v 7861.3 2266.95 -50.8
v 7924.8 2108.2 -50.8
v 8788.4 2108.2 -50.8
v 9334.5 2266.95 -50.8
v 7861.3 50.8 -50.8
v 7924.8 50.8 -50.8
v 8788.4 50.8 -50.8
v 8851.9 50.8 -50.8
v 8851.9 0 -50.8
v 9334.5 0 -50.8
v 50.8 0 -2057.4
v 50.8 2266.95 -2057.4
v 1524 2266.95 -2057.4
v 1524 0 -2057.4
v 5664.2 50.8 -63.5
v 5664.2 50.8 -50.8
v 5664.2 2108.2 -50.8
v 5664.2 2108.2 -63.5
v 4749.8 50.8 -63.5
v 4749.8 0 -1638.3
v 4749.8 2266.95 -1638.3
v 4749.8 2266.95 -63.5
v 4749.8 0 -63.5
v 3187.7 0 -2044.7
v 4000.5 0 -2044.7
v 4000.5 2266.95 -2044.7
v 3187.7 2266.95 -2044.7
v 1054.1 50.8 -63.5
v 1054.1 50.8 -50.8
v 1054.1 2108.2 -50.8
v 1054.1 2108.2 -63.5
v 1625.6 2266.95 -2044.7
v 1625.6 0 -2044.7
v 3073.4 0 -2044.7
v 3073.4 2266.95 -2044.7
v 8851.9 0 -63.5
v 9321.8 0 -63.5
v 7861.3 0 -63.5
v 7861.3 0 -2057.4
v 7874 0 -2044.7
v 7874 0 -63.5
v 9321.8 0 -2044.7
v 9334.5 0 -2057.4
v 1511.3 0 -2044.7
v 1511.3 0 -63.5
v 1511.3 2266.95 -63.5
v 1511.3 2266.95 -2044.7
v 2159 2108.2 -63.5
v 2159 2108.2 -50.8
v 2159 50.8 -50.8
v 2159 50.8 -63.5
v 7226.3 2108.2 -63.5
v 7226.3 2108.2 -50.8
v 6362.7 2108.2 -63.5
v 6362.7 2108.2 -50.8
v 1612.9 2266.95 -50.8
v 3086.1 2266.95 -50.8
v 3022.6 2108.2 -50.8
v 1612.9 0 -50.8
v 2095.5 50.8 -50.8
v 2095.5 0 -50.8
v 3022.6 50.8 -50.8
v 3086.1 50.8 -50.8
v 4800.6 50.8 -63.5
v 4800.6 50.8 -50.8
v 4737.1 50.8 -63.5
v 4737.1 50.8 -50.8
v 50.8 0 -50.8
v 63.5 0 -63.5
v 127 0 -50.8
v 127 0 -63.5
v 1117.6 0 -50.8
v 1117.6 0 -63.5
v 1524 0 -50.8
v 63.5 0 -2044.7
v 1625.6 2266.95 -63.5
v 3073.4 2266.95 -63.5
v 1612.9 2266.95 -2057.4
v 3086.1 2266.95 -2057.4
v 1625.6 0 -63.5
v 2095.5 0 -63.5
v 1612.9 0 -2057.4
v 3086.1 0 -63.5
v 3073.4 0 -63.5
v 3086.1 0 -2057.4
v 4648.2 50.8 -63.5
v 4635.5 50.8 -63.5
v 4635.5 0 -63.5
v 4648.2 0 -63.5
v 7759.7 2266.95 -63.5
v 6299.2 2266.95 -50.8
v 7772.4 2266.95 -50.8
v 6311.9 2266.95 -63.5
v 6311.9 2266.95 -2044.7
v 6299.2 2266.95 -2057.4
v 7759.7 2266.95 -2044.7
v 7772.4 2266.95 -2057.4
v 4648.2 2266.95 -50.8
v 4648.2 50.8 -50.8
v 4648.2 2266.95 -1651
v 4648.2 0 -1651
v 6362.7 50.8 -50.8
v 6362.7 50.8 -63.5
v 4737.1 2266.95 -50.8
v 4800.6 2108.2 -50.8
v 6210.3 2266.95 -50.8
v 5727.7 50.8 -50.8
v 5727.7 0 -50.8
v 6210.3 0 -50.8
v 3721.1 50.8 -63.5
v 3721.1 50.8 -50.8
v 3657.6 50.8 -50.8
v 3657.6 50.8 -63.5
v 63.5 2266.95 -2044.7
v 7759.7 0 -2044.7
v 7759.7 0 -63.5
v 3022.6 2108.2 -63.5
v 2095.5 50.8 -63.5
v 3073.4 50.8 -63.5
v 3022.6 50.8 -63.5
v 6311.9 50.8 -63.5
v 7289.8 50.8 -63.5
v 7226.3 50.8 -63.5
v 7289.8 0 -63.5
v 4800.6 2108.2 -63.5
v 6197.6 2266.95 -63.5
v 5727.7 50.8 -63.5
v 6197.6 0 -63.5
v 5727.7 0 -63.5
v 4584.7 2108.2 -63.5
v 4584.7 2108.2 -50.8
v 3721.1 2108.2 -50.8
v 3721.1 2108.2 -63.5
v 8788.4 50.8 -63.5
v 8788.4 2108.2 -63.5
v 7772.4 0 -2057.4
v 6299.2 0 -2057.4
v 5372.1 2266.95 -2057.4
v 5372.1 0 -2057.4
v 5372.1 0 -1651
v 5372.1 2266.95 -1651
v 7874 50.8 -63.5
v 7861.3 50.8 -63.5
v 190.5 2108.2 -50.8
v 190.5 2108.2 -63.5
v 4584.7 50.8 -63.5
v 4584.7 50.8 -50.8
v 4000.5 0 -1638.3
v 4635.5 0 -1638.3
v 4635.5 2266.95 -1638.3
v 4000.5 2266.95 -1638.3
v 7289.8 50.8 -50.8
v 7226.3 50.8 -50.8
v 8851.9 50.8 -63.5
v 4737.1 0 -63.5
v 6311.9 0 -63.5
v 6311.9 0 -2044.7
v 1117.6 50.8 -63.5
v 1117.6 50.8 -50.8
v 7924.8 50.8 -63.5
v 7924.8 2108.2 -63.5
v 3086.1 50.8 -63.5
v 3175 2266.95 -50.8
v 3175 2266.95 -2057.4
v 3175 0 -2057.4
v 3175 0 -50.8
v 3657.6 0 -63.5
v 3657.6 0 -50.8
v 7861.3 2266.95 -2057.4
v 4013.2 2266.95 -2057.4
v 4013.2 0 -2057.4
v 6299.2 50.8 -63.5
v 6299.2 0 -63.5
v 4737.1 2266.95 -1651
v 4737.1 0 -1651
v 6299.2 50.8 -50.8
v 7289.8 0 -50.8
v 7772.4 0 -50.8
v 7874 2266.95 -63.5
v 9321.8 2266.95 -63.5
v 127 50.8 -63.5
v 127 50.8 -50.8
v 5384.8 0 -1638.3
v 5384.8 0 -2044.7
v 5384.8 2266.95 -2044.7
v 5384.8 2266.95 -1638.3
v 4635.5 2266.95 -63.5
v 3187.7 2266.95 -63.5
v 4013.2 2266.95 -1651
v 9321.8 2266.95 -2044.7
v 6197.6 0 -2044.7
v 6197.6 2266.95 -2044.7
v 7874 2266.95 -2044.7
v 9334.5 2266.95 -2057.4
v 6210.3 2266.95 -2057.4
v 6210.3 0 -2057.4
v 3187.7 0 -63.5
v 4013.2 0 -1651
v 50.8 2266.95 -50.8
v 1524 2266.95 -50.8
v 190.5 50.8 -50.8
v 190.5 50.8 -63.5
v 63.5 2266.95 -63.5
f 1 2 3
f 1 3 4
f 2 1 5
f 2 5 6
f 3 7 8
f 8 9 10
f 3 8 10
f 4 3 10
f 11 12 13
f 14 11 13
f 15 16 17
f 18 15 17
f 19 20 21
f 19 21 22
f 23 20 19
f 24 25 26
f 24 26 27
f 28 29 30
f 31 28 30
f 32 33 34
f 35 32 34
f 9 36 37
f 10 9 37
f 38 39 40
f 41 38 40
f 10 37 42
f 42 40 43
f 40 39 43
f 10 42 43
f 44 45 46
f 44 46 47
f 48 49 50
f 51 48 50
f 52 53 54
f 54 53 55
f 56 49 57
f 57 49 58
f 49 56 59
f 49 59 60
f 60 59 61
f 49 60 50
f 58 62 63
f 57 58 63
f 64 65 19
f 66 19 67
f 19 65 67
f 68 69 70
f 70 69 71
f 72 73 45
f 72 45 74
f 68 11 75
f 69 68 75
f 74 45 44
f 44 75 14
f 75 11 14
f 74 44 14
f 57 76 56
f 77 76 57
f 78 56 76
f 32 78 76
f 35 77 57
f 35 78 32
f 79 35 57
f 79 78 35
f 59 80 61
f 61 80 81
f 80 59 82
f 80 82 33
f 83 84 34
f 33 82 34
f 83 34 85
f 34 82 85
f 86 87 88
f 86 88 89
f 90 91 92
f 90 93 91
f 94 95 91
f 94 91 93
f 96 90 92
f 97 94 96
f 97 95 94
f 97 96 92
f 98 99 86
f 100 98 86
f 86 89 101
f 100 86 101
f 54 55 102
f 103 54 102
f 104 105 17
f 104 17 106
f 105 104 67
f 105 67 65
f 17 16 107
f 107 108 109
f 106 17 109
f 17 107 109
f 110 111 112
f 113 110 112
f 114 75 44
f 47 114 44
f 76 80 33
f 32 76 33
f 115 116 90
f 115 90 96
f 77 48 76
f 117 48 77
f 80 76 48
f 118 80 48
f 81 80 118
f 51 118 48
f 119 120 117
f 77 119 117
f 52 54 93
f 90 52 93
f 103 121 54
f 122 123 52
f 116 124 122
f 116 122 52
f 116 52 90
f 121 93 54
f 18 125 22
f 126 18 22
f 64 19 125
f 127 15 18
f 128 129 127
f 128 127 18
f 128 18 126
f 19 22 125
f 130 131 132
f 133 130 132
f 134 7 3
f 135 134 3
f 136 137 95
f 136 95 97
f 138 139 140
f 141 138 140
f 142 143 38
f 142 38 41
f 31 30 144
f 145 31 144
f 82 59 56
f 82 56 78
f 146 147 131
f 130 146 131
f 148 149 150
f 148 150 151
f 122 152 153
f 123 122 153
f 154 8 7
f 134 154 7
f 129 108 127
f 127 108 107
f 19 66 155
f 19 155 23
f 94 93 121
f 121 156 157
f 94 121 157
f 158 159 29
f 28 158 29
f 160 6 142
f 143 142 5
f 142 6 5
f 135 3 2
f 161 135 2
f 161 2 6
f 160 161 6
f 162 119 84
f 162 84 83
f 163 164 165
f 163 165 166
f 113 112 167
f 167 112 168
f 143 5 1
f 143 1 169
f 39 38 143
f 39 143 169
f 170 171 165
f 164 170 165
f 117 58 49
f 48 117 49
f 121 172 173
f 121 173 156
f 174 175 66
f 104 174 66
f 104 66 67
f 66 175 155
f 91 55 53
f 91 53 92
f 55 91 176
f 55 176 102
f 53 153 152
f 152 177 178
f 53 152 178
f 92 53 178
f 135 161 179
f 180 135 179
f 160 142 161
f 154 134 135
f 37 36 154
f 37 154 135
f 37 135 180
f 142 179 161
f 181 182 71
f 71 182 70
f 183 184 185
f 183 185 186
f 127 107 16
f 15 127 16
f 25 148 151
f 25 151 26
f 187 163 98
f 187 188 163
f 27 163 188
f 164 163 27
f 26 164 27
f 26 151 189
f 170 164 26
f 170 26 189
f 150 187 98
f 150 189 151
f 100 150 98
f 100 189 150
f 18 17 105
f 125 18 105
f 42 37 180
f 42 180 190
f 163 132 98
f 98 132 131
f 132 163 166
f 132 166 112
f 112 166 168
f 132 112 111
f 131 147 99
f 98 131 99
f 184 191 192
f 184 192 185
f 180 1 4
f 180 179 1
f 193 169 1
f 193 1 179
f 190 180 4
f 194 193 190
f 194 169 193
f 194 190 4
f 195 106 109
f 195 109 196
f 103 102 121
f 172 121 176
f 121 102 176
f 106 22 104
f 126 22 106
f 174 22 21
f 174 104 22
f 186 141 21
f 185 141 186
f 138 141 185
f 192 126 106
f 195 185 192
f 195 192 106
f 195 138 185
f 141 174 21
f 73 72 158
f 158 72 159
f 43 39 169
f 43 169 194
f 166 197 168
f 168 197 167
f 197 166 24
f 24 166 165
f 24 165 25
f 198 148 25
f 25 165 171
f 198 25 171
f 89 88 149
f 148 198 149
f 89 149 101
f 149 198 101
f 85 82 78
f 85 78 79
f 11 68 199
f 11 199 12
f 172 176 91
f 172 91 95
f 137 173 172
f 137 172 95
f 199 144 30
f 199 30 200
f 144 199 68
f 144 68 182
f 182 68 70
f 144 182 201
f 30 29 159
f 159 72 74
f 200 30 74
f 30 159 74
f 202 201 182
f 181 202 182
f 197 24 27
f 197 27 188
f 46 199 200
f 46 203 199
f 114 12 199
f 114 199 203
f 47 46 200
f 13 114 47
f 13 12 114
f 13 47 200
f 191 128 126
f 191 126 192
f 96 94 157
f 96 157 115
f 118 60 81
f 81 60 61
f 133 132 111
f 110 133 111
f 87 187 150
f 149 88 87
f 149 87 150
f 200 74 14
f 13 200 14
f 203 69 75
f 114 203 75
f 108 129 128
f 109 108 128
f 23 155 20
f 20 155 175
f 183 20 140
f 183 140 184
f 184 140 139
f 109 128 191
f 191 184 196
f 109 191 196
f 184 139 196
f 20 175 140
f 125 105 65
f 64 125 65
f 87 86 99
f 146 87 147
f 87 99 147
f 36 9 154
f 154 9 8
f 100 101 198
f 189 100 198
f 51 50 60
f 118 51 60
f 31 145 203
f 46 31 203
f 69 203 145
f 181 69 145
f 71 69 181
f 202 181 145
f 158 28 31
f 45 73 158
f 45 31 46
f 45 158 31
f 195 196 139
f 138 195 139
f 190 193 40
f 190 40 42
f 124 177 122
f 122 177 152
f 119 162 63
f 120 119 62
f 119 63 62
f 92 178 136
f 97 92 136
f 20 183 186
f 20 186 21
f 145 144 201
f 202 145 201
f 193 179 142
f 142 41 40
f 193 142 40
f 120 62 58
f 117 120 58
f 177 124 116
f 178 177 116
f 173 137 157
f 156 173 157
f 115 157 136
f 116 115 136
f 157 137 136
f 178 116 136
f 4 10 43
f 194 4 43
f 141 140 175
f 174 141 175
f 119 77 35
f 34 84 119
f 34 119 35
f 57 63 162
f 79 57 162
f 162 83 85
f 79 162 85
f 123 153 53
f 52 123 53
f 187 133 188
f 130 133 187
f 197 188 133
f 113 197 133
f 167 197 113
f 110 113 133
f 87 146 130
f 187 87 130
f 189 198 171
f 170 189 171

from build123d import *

# Parameters (mm, degrees)
SKETCH2_W             = 1473.2
SKETCH2_H             = 2006.6
SKETCH2_W_2           = 1447.8
SKETCH2_H_2           = 1981.2
BOSS_EXTRUDE1_DEPTH   = 2266.95
BOSS_EXTRUDE1_2_DEPTH = 2266.95
BOSS_EXTRUDE1_3_DEPTH = 2266.95
BOSS_EXTRUDE1_4_DEPTH = 2266.95
BOSS_EXTRUDE1_5_DEPTH = 2266.95
BOSS_EXTRUDE1_6_DEPTH = 2266.95
CUT_EXTRUDE1_DEPTH    = 12.7


with BuildPart() as part:
    # Sketch2 → Boss-Extrude1 (new body)
    with BuildSketch(Plane(origin=(0, 0, 0), x_dir=(1, 0, 0), z_dir=(0, 1, 0))):
        with Locations((2349.5, 1054.1)):
            Rectangle(SKETCH2_W, SKETCH2_H)
        with Locations((2349.5, 1054.1)):
            Rectangle(SKETCH2_W_2, SKETCH2_H_2, mode=Mode.SUBTRACT)
    extrude(amount=BOSS_EXTRUDE1_DEPTH)


with BuildPart() as body_2:
    # Sketch2 → Boss-Extrude1 2 (new body)
    with BuildSketch(Plane(origin=(0, 0, 0), x_dir=(1, 0, 0), z_dir=(0, 1, 0))):
        Polygon((4013.2, 1651), (4013.2, 2057.4), (3175, 2057.4), (3175, 50.8), (4648.2, 50.8), (4648.2, 1651), align=None)
        Polygon((3187.7, 63.5), (4635.5, 63.5), (4635.5, 1638.3), (4000.5, 1638.3), (4000.5, 2044.7), (3187.7, 2044.7), align=None, mode=Mode.SUBTRACT)
    extrude(amount=BOSS_EXTRUDE1_2_DEPTH)


with BuildPart() as body_3:
    # Sketch2 → Boss-Extrude1 3 (new body)
    with BuildSketch(Plane(origin=(0, 0, 0), x_dir=(1, 0, 0), z_dir=(0, 1, 0))):
        with Locations((787.4, 1054.1)):
            Rectangle(SKETCH2_W, SKETCH2_H)
        with Locations((787.4, 1054.1)):
            Rectangle(SKETCH2_W_2, SKETCH2_H_2, mode=Mode.SUBTRACT)
    extrude(amount=BOSS_EXTRUDE1_3_DEPTH)


with BuildPart() as body_4:
    # Sketch2 → Boss-Extrude1 4 (new body)
    with BuildSketch(Plane(origin=(0, 0, 0), x_dir=(1, 0, 0), z_dir=(0, 1, 0))):
        with Locations((7035.8, 1054.1)):
            Rectangle(SKETCH2_W, SKETCH2_H)
        with Locations((7035.8, 1054.1)):
            Rectangle(SKETCH2_W_2, SKETCH2_H_2, mode=Mode.SUBTRACT)
    extrude(amount=BOSS_EXTRUDE1_4_DEPTH)


with BuildPart() as body_5:
    # Sketch2 → Boss-Extrude1 5 (new body)
    with BuildSketch(Plane(origin=(0, 0, 0), x_dir=(1, 0, 0), z_dir=(0, 1, 0))):
        Polygon((5372.1, 2057.4), (5372.1, 1651), (4737.1, 1651), (4737.1, 50.8), (6210.3, 50.8), (6210.3, 2057.4), align=None)
        Polygon((5384.8, 1638.3), (4749.8, 1638.3), (4749.8, 63.5), (6197.6, 63.5), (6197.6, 2044.7), (5384.8, 2044.7), align=None, mode=Mode.SUBTRACT)
    extrude(amount=BOSS_EXTRUDE1_5_DEPTH)


with BuildPart() as body_6:
    # Sketch2 → Boss-Extrude1 6 (new body)
    with BuildSketch(Plane(origin=(0, 0, 0), x_dir=(1, 0, 0), z_dir=(0, 1, 0))):
        with Locations((8597.9, 1054.1)):
            Rectangle(SKETCH2_W, SKETCH2_H)
        with Locations((8597.9, 1054.1)):
            Rectangle(SKETCH2_W_2, SKETCH2_H_2, mode=Mode.SUBTRACT)
    extrude(amount=BOSS_EXTRUDE1_6_DEPTH)


with BuildPart() as cut_extrude1_tool:
    # Sketch3 → Cut-Extrude1 (new body)
    with BuildSketch(Plane.XY.offset(-50.8)):
        Polygon((127, 0), (1117.6, 0), (1117.6, 50.8), (1054.1, 50.8), (1054.1, 2108.2), (190.5, 2108.2), (190.5, 50.8), (127, 50.8), align=None)
        Polygon((2095.5, 0), (3086.1, 0), (3086.1, 50.8), (3022.6, 50.8), (3022.6, 2108.2), (2159, 2108.2), (2159, 50.8), (2095.5, 50.8), align=None)
        Polygon((3657.6, 50.8), (3657.6, 0), (4648.2, 0), (4648.2, 50.8), (4584.7, 50.8), (4584.7, 2108.2), (3721.1, 2108.2), (3721.1, 50.8), align=None)
        Polygon((4800.6, 50.8), (4737.1, 50.8), (4737.1, 0), (5727.7, 0), (5727.7, 50.8), (5664.2, 50.8), (5664.2, 2108.2), (4800.6, 2108.2), align=None)
        Polygon((6299.2, 50.8), (6299.2, 0), (7289.8, 0), (7289.8, 50.8), (7226.3, 50.8), (7226.3, 2108.2), (6362.7, 2108.2), (6362.7, 50.8), align=None)
        Polygon((7861.3, 50.8), (7861.3, 0), (8851.9, 0), (8851.9, 50.8), (8788.4, 50.8), (8788.4, 2108.2), (7924.8, 2108.2), (7924.8, 50.8), align=None)
    extrude(amount=-CUT_EXTRUDE1_DEPTH)


with BuildPart() as part_1:
    add(part.part)

    # Cut-Extrude1: cut by cut_extrude1_tool
    add(cut_extrude1_tool.part, mode=Mode.SUBTRACT)


with BuildPart() as body_2_1:
    add(body_2.part)

    # Cut-Extrude1: cut by cut_extrude1_tool
    add(cut_extrude1_tool.part, mode=Mode.SUBTRACT)


with BuildPart() as body_3_1:
    add(body_3.part)

    # Cut-Extrude1: cut by cut_extrude1_tool
    add(cut_extrude1_tool.part, mode=Mode.SUBTRACT)


with BuildPart() as body_4_1:
    add(body_4.part)

    # Cut-Extrude1: cut by cut_extrude1_tool
    add(cut_extrude1_tool.part, mode=Mode.SUBTRACT)


with BuildPart() as body_5_1:
    add(body_5.part)

    # Cut-Extrude1: cut by cut_extrude1_tool
    add(cut_extrude1_tool.part, mode=Mode.SUBTRACT)


with BuildPart() as body_6_1:
    add(body_6.part)

    # Cut-Extrude1: cut by cut_extrude1_tool
    add(cut_extrude1_tool.part, mode=Mode.SUBTRACT)


solid = Compound([part_1.part, body_2_1.part, body_3_1.part, body_4_1.part, body_5_1.part, body_6_1.part])
